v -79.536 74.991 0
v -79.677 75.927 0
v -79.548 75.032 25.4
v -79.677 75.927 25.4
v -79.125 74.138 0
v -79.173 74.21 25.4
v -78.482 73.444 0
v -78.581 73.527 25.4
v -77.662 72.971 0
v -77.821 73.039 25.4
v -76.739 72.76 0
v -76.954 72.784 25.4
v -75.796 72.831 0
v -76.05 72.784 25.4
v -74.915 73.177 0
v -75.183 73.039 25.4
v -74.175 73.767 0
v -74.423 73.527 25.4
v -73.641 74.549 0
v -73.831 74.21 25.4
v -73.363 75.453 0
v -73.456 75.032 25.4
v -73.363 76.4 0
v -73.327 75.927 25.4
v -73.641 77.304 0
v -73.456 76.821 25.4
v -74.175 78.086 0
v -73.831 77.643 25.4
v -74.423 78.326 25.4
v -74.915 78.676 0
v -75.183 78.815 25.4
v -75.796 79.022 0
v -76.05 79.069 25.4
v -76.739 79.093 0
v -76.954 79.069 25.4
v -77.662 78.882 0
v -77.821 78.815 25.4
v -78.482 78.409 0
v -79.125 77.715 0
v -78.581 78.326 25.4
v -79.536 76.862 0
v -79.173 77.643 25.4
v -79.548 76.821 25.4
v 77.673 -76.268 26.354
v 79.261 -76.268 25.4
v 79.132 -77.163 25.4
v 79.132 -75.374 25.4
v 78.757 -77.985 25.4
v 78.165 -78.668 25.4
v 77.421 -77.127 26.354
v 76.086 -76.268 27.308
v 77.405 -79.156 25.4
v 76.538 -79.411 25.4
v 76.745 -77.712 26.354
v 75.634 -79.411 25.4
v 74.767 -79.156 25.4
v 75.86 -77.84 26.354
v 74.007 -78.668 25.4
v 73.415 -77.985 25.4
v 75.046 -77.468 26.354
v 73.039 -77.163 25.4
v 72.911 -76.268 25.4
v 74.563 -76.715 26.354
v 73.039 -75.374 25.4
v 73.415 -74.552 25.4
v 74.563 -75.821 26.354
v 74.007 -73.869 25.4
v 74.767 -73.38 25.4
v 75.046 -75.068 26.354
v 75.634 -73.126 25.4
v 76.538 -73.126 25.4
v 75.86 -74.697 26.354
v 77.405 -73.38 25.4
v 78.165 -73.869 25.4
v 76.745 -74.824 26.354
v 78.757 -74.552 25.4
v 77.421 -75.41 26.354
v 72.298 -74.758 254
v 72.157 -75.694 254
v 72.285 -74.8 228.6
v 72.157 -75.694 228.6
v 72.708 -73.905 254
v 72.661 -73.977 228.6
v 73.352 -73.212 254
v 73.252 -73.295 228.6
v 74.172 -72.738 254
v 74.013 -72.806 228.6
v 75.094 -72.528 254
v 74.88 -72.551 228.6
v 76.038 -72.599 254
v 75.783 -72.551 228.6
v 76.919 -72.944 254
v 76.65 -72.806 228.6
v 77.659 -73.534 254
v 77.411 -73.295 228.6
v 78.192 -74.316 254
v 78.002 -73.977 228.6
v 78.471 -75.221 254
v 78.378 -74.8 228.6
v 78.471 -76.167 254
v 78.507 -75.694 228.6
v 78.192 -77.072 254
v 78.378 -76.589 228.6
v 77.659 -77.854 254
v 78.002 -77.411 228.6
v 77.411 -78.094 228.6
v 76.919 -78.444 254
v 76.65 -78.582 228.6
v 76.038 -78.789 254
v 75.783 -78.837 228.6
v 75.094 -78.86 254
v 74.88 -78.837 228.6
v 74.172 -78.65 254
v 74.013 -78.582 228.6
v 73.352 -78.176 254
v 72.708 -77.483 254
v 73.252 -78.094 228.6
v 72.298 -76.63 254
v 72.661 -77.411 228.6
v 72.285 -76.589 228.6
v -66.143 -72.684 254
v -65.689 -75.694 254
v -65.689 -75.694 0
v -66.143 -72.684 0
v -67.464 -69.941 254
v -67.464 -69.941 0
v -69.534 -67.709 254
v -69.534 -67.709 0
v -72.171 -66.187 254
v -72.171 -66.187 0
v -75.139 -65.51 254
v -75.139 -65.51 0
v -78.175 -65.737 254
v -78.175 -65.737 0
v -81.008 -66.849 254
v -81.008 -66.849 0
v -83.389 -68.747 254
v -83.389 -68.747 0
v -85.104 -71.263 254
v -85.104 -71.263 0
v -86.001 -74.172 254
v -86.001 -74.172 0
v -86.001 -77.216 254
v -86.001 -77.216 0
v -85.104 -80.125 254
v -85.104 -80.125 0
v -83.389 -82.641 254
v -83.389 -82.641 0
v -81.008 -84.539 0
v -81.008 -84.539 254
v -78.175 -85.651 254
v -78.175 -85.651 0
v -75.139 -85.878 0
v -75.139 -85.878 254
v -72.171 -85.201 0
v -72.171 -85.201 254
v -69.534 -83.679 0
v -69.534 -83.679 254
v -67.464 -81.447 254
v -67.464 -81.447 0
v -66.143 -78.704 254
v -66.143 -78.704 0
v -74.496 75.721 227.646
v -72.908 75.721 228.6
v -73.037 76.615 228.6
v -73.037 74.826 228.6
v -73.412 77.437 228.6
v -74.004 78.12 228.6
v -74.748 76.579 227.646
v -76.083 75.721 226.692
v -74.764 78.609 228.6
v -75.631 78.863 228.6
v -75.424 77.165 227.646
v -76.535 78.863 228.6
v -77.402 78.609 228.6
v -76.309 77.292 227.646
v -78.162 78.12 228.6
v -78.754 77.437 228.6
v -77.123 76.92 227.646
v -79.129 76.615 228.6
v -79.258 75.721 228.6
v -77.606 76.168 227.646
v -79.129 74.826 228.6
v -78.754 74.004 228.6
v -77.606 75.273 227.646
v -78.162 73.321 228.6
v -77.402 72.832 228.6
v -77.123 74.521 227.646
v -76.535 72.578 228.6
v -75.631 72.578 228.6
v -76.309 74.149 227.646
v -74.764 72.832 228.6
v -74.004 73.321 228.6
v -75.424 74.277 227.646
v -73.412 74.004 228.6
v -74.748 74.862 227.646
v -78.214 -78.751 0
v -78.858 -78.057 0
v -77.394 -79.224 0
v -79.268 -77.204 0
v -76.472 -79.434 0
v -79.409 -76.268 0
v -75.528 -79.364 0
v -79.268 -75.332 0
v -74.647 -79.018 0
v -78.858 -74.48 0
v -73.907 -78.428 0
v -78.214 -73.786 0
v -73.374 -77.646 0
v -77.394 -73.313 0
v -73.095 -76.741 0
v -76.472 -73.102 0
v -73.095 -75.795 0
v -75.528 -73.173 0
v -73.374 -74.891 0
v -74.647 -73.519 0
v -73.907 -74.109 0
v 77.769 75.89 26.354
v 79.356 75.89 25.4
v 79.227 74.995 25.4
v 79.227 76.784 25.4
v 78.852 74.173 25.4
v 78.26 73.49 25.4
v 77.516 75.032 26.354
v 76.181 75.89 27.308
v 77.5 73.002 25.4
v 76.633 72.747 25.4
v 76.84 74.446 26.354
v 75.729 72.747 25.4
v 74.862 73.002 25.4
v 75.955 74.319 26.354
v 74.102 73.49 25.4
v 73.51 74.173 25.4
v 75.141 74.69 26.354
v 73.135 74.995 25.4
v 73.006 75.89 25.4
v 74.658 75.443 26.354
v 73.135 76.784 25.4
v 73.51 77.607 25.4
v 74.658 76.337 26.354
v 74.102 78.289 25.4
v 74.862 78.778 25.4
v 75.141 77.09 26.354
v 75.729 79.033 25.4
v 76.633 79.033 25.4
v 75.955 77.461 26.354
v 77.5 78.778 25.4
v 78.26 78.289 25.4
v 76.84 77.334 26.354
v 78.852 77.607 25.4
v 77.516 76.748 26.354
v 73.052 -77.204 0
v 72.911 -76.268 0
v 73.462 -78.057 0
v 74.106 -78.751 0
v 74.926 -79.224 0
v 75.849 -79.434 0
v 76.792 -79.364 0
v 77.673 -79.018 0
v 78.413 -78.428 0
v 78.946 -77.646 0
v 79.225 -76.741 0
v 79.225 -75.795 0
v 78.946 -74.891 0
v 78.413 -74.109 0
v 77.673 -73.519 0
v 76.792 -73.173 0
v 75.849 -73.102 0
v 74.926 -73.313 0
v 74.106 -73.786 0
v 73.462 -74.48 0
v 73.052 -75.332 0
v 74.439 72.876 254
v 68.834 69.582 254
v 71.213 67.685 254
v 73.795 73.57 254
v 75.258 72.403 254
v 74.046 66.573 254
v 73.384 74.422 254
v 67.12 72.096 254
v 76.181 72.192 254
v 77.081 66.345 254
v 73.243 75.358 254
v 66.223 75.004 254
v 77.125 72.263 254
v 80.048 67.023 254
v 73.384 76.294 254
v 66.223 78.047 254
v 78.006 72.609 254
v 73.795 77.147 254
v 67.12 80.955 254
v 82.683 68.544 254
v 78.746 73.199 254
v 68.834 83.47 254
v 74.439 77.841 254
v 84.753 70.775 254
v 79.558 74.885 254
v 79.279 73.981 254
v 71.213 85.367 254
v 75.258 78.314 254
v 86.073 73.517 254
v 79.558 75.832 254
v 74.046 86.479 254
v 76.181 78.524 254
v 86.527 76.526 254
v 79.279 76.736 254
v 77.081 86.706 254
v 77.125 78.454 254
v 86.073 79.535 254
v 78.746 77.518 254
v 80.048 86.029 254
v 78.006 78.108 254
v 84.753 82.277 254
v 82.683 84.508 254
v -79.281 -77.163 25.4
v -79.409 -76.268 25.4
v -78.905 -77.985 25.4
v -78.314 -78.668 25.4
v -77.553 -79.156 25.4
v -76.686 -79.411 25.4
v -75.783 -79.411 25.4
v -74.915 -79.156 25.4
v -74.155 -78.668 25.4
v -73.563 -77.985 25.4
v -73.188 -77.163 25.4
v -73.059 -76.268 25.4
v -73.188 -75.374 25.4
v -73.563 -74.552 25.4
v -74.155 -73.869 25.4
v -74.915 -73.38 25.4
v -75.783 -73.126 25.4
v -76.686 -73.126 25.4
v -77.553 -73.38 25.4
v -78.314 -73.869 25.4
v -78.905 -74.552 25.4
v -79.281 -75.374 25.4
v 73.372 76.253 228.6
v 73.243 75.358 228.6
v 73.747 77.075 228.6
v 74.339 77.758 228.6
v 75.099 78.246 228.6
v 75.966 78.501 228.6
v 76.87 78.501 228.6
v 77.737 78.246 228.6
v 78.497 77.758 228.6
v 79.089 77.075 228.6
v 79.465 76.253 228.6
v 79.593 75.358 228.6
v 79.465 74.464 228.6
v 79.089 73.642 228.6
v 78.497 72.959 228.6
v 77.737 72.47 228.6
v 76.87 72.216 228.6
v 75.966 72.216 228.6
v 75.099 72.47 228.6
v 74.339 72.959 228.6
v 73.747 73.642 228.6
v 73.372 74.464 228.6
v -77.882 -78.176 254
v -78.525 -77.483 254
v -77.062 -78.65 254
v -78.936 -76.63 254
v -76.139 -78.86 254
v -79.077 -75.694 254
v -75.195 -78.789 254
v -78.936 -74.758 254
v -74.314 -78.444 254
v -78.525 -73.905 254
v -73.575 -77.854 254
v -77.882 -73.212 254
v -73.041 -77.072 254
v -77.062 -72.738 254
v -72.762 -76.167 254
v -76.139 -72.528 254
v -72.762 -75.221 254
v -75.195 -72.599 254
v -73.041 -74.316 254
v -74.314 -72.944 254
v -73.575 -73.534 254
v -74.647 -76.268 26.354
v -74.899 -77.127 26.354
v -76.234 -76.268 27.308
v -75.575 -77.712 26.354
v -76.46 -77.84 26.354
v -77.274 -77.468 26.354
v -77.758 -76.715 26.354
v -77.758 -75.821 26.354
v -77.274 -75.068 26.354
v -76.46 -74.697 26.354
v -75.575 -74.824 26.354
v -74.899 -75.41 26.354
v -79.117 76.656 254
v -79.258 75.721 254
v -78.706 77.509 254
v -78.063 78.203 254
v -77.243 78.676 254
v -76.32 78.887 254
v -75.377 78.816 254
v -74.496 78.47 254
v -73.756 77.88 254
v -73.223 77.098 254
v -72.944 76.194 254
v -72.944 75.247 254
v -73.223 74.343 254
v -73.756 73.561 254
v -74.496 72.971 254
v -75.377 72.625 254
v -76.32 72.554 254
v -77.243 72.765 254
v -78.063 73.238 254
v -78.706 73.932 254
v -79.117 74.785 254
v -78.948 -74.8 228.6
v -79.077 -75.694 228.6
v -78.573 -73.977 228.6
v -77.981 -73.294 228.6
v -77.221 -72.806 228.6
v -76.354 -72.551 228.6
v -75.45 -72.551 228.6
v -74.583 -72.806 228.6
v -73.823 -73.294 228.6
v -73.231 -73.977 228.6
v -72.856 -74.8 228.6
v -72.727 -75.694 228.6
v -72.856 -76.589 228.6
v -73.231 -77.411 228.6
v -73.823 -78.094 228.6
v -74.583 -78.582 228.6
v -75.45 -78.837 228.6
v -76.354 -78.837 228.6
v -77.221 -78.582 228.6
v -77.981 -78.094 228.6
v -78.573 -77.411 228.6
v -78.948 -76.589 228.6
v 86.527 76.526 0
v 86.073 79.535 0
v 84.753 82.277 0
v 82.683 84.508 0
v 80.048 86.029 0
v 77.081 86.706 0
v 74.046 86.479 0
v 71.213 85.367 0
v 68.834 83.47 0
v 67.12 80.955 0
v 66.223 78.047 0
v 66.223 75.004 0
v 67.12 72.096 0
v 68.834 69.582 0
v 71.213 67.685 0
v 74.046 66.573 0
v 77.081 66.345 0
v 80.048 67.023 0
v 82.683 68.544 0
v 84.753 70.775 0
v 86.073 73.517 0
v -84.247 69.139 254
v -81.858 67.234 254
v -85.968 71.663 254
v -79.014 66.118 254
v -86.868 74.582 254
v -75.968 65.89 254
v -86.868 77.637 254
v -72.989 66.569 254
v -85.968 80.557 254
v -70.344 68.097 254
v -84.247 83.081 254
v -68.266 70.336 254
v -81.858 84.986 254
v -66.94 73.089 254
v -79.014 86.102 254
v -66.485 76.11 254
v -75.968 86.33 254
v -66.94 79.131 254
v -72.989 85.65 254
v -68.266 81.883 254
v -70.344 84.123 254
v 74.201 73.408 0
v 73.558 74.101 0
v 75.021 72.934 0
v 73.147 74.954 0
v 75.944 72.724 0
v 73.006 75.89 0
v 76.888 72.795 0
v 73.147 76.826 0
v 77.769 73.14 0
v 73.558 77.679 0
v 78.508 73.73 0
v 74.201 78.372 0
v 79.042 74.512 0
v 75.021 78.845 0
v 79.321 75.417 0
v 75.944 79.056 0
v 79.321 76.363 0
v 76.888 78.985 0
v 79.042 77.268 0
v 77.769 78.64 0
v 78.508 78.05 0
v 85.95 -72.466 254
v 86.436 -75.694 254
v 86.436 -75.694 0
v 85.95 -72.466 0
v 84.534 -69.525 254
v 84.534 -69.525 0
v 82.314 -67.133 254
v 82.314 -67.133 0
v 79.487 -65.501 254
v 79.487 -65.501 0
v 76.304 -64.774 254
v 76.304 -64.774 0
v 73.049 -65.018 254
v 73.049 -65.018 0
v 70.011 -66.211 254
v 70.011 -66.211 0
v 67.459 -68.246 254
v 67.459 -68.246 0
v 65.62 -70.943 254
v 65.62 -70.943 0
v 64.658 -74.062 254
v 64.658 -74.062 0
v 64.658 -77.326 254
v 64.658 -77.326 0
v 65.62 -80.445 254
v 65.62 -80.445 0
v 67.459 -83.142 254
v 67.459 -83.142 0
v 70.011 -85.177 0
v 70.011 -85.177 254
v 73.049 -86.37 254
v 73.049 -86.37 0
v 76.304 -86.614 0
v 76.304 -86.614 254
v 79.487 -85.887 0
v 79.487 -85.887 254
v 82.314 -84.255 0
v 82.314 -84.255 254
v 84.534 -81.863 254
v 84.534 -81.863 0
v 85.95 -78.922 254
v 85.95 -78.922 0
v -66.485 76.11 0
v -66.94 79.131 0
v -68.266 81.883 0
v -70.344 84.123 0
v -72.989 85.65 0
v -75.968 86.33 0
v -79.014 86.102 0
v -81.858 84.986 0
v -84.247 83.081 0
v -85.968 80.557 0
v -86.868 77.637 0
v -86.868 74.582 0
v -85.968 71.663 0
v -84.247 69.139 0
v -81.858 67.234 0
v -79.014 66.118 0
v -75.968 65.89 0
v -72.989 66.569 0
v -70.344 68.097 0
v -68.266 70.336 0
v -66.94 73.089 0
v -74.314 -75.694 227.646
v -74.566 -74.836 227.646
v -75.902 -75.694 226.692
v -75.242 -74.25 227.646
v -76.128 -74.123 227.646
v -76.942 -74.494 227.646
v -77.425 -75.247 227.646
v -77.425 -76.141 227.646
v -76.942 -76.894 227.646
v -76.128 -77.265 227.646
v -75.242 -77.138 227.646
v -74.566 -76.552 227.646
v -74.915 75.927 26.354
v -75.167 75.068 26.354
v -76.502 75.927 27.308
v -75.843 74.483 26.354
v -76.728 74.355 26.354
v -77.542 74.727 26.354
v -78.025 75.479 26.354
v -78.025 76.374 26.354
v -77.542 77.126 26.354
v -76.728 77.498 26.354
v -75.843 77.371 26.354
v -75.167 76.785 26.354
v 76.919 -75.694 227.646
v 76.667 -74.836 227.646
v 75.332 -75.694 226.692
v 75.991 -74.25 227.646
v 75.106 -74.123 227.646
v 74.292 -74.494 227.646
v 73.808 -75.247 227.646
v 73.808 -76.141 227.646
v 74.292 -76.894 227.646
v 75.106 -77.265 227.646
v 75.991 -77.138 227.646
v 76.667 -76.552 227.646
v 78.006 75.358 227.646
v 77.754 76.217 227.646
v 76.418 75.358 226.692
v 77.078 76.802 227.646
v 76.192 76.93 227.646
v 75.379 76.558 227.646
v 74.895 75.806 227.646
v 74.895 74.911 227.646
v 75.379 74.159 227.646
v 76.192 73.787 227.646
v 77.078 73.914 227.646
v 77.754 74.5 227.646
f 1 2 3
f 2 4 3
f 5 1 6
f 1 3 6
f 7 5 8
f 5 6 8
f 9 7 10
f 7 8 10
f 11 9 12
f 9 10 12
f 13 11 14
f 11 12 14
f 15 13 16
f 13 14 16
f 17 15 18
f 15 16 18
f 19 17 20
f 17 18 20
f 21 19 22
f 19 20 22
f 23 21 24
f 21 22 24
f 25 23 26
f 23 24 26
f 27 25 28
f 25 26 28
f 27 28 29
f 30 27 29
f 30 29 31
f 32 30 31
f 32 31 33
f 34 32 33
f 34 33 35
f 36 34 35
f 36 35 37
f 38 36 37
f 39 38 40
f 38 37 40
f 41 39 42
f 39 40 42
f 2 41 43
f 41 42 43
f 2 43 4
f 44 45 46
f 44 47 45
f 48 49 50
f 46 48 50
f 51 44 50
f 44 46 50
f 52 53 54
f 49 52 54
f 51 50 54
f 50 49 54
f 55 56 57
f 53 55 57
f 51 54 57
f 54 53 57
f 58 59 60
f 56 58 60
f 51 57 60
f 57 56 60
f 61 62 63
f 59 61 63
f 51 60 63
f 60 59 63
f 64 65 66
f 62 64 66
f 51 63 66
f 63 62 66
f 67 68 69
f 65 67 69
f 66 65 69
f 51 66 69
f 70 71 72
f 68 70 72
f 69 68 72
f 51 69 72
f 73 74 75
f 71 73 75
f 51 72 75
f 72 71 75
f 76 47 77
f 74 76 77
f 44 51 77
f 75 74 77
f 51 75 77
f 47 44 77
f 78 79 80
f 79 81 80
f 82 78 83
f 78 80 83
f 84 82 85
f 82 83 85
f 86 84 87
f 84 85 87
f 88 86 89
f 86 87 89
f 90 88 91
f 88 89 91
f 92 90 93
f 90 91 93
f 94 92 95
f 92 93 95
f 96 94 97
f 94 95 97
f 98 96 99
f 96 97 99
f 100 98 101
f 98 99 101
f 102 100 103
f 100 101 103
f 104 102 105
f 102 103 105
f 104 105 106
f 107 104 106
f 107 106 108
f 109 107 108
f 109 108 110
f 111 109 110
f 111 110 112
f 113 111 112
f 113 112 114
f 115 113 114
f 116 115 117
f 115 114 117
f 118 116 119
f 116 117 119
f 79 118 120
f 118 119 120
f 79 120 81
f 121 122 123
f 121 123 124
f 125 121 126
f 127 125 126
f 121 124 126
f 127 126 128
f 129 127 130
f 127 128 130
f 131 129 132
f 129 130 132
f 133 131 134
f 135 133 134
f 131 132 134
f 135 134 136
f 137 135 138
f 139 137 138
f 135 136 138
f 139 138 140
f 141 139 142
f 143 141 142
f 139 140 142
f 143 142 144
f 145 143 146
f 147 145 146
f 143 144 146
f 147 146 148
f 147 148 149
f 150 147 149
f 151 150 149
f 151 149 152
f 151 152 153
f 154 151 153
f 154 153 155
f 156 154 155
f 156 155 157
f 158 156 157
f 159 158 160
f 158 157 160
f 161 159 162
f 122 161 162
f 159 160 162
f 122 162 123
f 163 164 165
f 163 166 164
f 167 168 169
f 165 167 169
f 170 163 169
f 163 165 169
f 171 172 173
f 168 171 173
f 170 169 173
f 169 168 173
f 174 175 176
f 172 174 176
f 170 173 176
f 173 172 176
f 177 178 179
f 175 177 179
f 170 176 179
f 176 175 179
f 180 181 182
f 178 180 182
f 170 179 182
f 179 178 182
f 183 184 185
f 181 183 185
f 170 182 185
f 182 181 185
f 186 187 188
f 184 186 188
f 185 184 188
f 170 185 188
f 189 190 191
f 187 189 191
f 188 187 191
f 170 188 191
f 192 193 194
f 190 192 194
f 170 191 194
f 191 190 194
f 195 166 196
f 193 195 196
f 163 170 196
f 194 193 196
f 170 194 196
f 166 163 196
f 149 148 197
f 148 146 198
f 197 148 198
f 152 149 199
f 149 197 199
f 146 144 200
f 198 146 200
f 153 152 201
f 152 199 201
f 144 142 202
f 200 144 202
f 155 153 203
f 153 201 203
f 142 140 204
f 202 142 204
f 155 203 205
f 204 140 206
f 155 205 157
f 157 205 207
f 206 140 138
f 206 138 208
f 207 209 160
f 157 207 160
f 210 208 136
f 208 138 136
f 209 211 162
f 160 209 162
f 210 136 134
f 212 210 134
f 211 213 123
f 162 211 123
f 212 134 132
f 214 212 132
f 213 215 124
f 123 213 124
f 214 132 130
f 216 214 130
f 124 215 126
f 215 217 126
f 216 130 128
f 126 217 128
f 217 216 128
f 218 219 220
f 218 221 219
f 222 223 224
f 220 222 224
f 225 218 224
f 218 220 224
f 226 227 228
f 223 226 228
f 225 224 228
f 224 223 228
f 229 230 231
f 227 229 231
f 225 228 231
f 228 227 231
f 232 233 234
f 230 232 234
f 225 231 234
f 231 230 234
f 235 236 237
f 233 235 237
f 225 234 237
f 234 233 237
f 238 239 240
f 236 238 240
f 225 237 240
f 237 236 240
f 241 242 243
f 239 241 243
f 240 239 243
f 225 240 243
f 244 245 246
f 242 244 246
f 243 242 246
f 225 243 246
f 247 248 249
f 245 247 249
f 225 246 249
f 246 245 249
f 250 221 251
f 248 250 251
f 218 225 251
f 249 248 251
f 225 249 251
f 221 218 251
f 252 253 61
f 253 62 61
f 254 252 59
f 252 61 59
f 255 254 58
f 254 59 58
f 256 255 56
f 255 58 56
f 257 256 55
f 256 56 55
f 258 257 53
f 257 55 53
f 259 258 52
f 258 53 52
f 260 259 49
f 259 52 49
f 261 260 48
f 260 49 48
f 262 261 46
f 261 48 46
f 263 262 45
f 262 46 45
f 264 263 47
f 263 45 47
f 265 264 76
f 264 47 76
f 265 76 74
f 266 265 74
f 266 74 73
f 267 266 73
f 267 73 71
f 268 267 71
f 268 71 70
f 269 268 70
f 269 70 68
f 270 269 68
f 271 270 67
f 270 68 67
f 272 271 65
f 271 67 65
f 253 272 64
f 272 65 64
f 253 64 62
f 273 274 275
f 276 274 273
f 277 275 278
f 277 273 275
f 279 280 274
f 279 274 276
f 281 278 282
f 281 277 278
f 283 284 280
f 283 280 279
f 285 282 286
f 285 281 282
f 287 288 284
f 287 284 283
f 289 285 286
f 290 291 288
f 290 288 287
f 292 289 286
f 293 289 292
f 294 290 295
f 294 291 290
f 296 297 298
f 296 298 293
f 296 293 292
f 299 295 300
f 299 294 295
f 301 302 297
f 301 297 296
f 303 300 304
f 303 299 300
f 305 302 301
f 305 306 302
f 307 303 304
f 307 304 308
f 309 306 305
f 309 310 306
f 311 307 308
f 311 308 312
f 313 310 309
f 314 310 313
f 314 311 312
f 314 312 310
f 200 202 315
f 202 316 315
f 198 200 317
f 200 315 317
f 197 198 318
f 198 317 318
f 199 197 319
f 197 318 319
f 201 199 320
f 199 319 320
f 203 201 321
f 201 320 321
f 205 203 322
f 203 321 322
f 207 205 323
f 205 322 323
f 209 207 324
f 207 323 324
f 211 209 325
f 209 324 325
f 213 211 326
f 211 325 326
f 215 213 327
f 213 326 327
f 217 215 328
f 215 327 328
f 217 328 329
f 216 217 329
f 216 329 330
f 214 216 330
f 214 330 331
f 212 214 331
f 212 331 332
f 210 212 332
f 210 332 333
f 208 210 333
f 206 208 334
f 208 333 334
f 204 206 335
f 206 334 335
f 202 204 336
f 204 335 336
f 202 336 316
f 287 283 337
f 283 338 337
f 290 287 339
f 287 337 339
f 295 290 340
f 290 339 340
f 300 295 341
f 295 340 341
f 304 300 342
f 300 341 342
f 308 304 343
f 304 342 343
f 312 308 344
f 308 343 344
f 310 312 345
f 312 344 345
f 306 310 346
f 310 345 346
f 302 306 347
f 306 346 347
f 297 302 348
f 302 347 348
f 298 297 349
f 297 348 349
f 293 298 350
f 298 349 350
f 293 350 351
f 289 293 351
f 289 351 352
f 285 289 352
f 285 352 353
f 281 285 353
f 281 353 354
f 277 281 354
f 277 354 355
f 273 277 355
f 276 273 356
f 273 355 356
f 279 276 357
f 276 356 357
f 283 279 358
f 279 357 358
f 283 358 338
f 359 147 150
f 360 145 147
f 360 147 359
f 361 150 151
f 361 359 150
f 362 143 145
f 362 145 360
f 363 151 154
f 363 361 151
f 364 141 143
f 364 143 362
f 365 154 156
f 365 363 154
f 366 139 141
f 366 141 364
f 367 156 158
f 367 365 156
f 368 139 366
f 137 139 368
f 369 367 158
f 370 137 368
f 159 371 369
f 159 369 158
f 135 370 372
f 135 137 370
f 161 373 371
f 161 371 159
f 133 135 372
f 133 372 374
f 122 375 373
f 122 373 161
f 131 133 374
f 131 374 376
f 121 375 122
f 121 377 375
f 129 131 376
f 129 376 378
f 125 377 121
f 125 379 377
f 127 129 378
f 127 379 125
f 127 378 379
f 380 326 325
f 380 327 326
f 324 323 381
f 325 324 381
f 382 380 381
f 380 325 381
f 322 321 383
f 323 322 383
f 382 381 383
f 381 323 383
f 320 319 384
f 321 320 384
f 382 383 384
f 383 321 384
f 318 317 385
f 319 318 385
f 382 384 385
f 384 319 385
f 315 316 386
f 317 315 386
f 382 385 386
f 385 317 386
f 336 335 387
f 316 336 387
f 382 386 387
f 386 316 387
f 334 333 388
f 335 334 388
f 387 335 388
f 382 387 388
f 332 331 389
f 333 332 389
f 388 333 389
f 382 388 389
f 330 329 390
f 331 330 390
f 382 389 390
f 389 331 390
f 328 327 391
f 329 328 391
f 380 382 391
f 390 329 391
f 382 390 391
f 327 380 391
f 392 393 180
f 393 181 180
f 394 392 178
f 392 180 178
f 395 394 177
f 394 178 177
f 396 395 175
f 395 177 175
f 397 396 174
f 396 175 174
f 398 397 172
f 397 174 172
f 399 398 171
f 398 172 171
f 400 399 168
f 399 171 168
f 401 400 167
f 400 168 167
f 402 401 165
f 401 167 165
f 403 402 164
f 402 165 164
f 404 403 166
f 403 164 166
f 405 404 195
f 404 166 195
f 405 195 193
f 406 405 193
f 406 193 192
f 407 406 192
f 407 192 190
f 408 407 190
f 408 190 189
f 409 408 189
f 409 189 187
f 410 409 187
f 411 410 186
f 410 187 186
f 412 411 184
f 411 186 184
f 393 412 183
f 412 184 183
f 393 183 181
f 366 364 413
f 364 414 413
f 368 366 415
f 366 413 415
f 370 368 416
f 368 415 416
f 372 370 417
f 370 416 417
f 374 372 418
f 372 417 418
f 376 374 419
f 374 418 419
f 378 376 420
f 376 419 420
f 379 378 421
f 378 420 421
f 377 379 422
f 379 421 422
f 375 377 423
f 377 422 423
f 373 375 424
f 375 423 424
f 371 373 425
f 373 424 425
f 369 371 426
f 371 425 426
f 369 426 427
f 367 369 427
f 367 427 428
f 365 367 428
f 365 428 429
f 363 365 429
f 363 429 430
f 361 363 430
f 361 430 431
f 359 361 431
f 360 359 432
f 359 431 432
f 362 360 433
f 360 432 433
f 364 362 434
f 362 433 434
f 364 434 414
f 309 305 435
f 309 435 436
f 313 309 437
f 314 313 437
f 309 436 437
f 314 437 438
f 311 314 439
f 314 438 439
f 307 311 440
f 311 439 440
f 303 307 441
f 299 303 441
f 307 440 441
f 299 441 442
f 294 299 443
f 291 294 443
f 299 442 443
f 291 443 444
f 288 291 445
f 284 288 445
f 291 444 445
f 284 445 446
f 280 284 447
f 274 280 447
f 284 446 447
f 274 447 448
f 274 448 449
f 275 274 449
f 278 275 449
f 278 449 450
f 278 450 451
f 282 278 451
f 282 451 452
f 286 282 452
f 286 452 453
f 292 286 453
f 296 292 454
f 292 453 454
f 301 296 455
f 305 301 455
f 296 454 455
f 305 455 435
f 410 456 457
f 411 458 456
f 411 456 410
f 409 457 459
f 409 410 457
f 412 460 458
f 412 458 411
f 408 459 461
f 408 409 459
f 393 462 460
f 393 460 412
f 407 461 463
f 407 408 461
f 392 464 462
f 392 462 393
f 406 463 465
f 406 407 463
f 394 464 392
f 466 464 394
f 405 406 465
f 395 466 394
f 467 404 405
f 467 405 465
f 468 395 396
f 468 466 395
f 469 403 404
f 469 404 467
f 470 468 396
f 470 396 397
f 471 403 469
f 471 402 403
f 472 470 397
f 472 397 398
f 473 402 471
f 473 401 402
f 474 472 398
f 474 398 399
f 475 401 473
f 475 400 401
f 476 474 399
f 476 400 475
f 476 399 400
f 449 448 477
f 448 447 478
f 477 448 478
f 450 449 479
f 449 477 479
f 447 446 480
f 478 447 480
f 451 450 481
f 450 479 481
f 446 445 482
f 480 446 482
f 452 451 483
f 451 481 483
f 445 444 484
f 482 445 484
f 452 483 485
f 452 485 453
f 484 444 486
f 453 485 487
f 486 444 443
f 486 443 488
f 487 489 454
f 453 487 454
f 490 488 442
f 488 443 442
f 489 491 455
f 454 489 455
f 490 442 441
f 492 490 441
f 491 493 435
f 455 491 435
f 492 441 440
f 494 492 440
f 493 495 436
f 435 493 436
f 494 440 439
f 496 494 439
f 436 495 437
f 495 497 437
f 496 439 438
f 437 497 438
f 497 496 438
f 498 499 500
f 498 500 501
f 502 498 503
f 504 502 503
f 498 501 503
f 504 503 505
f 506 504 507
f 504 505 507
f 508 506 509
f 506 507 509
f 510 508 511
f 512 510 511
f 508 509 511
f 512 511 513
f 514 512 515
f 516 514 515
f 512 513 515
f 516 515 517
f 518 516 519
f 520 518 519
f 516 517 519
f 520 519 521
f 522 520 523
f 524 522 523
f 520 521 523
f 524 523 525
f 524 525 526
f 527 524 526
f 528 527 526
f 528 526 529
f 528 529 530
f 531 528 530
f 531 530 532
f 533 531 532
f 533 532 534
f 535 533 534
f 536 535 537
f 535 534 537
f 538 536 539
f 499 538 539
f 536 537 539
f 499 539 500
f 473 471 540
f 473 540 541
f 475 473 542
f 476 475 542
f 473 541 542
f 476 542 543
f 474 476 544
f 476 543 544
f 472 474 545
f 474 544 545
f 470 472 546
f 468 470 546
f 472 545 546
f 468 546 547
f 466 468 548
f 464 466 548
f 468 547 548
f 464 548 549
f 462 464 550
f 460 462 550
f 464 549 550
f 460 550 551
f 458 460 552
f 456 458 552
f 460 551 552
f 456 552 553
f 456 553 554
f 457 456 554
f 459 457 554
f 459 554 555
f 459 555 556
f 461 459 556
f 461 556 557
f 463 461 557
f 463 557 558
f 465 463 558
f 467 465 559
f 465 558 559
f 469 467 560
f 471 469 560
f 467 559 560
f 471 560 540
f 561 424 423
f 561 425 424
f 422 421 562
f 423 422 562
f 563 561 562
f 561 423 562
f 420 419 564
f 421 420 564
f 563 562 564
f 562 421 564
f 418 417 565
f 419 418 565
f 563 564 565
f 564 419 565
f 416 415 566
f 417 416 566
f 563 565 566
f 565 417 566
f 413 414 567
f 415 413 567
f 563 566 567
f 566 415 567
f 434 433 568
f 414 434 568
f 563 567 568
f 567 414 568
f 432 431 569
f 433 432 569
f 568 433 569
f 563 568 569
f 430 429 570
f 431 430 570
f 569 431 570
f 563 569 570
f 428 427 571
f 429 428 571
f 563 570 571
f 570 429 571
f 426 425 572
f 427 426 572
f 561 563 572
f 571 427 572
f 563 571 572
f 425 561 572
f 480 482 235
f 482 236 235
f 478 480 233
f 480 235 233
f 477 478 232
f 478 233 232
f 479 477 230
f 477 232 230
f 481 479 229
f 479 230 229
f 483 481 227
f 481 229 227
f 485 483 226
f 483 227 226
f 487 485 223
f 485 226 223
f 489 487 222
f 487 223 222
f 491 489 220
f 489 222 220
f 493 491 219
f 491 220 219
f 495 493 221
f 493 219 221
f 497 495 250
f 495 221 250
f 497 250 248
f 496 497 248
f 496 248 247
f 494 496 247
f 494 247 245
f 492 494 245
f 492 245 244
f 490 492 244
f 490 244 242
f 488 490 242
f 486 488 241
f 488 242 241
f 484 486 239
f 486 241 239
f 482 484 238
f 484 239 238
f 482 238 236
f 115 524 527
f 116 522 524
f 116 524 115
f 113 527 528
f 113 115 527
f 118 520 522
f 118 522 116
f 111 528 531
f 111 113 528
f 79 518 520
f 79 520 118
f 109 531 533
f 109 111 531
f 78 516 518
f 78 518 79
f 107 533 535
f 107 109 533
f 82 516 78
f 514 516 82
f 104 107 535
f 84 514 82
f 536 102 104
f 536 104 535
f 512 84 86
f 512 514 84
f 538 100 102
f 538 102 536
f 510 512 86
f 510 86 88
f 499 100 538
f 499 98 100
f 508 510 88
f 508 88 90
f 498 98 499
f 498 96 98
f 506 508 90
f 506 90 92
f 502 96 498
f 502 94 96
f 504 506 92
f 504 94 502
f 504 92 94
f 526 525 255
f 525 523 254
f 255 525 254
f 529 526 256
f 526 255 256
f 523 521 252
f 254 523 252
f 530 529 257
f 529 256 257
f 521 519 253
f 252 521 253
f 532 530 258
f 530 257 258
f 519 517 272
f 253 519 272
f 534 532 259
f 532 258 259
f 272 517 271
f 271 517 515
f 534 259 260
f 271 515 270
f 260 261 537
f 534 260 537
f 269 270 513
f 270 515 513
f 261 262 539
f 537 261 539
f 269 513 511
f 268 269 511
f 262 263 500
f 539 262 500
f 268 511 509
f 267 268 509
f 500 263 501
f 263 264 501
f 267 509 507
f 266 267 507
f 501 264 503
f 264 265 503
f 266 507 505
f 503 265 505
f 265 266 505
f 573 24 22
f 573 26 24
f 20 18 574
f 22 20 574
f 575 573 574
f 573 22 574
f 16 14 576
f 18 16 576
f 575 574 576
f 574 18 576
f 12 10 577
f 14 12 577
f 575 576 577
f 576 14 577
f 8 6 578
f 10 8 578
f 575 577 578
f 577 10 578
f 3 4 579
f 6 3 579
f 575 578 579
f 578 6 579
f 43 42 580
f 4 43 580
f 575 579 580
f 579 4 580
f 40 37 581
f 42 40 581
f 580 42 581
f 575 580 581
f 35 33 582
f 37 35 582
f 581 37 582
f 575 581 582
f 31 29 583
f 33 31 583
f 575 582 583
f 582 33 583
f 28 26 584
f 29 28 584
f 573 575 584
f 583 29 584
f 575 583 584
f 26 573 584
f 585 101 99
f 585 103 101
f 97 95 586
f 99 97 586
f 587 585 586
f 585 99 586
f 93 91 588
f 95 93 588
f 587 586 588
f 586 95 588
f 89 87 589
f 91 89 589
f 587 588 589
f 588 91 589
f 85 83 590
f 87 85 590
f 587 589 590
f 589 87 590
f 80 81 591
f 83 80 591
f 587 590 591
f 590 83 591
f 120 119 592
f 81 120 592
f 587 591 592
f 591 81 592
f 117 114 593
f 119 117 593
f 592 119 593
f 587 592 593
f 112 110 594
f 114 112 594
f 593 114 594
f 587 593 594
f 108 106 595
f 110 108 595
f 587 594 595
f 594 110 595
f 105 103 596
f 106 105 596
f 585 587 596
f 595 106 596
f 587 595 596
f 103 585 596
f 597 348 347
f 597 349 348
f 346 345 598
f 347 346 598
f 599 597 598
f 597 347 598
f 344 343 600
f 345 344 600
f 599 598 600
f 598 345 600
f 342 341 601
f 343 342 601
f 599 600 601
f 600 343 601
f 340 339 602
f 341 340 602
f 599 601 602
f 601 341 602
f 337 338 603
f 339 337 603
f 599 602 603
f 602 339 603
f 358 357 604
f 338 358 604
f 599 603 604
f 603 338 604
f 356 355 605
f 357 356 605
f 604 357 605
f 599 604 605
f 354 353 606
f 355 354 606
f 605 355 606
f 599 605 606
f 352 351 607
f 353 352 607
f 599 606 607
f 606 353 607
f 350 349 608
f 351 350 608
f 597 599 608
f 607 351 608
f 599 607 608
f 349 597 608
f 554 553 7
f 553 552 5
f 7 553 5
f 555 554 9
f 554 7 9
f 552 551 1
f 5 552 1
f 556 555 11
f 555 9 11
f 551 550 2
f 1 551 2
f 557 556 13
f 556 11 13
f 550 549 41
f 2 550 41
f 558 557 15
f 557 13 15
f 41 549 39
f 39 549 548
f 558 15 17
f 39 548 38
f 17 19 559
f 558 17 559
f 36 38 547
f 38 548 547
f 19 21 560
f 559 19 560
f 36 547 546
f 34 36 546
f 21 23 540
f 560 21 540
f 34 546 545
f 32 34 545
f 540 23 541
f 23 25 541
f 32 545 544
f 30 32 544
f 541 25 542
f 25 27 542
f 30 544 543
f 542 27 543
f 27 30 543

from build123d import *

# Parameters (mm, degrees)
F0_R       = 10.2489411148
F1_DEPTH   = 254
F0_R_2     = 10.2089969217
F0_R_3     = 10.9504197112
F0_R_4     = 10.2130357503
F3_D       = 6.35
F3_DEPTH   = 25.4
F3_TIP     = 1.9077324654
F3_2_D     = 6.35
F3_2_DEPTH = 25.4
F3_2_TIP   = 1.9077324654
F3_3_D     = 6.35
F3_3_DEPTH = 25.4
F3_3_TIP   = 1.9077324654
F3_4_D     = 6.35
F3_4_DEPTH = 25.4
F3_4_TIP   = 1.9077324654
F5_D       = 6.35
F5_DEPTH   = 25.4
F5_TIP     = 1.9077324654
F5_2_D     = 6.35
F5_2_DEPTH = 25.4
F5_2_TIP   = 1.9077324654
F5_3_D     = 6.35
F5_3_DEPTH = 25.4
F5_3_TIP   = 1.9077324654
F5_4_D     = 6.35
F5_4_DEPTH = 25.4
F5_4_TIP   = 1.9077324654


with BuildPart() as f1:
    # F0 (on Top) → F1 (new body)
    with BuildSketch(Plane.XY):
        with Locations((-76.7337605357, 76.1099159718)):
            Circle(F0_R)
    extrude(amount=F1_DEPTH)

    # F3
    with Locations(Plane.XY.offset(254)):
        with Locations((-76.0830789804, 75.7205635309), (76.4182135463, 75.3583312035), (75.3315091133, -75.6940171123), (-75.9019628167, -75.6940022111)):
            Hole(F3_D / 2, depth=F3_DEPTH)
            with Locations((0, 0, -(F3_DEPTH + F3_TIP / 2))):  # 118° drill point
                Cone(0, F3_D / 2, F3_TIP, mode=Mode.SUBTRACT)

    # F5
    with Locations(Plane(origin=(0, 0, 0), x_dir=(1, 0, 0), z_dir=(0, 0, -1))):
        with Locations((-76.2344002724, 76.2682408094), (76.08576864, 76.2682408094), (76.1810094118, -75.8899748325), (-76.5020474792, -75.9265944362)):
            Hole(F5_D / 2, depth=F5_DEPTH)
            with Locations((0, 0, -(F5_DEPTH + F5_TIP / 2))):  # 118° drill point
                Cone(0, F5_D / 2, F5_TIP, mode=Mode.SUBTRACT)


with BuildPart() as f1b:
    # F0 (on Top) → F1, piece 2 (new body)
    with BuildSketch(Plane.XY):
        with Locations((76.3178616762, 76.5258148313)):
            Circle(F0_R_2)
    extrude(amount=F1_DEPTH)

    # F3#2
    with Locations(Plane.XY.offset(254)):
        with Locations((-76.0830789804, 75.7205635309), (76.4182135463, 75.3583312035), (75.3315091133, -75.6940171123), (-75.9019628167, -75.6940022111)):
            Hole(F3_2_D / 2, depth=F3_2_DEPTH)
            with Locations((0, 0, -(F3_2_DEPTH + F3_2_TIP / 2))):  # 118° drill point
                Cone(0, F3_2_D / 2, F3_2_TIP, mode=Mode.SUBTRACT)

    # F5#2
    with Locations(Plane(origin=(0, 0, 0), x_dir=(1, 0, 0), z_dir=(0, 0, -1))):
        with Locations((-76.2344002724, 76.2682408094), (76.08576864, 76.2682408094), (76.1810094118, -75.8899748325), (-76.5020474792, -75.9265944362)):
            Hole(F5_2_D / 2, depth=F5_2_DEPTH)
            with Locations((0, 0, -(F5_2_DEPTH + F5_2_TIP / 2))):  # 118° drill point
                Cone(0, F5_2_D / 2, F5_2_TIP, mode=Mode.SUBTRACT)


with BuildPart() as f1c:
    # F0 (on Top) → F1, piece 3 (new body)
    with BuildSketch(Plane.XY):
        with Locations((75.4860490561, -75.6940022111)):
            Circle(F0_R_3)
    extrude(amount=F1_DEPTH)

    # F3#3
    with Locations(Plane.XY.offset(254)):
        with Locations((-76.0830789804, 75.7205635309), (76.4182135463, 75.3583312035), (75.3315091133, -75.6940171123), (-75.9019628167, -75.6940022111)):
            Hole(F3_3_D / 2, depth=F3_3_DEPTH)
            with Locations((0, 0, -(F3_3_DEPTH + F3_3_TIP / 2))):  # 118° drill point
                Cone(0, F3_3_D / 2, F3_3_TIP, mode=Mode.SUBTRACT)

    # F5#3
    with Locations(Plane(origin=(0, 0, 0), x_dir=(1, 0, 0), z_dir=(0, 0, -1))):
        with Locations((-76.2344002724, 76.2682408094), (76.08576864, 76.2682408094), (76.1810094118, -75.8899748325), (-76.5020474792, -75.9265944362)):
            Hole(F5_3_D / 2, depth=F5_3_DEPTH)
            with Locations((0, 0, -(F5_3_DEPTH + F5_3_TIP / 2))):  # 118° drill point
                Cone(0, F5_3_D / 2, F5_3_TIP, mode=Mode.SUBTRACT)


with BuildPart() as f1d:
    # F0 (on Top) → F1, piece 4 (new body)
    with BuildSketch(Plane.XY):
        with Locations((-75.9019628167, -75.6940022111)):
            Circle(F0_R_4)
    extrude(amount=F1_DEPTH)

    # F3#4
    with Locations(Plane.XY.offset(254)):
        with Locations((-76.0830789804, 75.7205635309), (76.4182135463, 75.3583312035), (75.3315091133, -75.6940171123), (-75.9019628167, -75.6940022111)):
            Hole(F3_4_D / 2, depth=F3_4_DEPTH)
            with Locations((0, 0, -(F3_4_DEPTH + F3_4_TIP / 2))):  # 118° drill point
                Cone(0, F3_4_D / 2, F3_4_TIP, mode=Mode.SUBTRACT)

    # F5#4
    with Locations(Plane(origin=(0, 0, 0), x_dir=(1, 0, 0), z_dir=(0, 0, -1))):
        with Locations((-76.2344002724, 76.2682408094), (76.08576864, 76.2682408094), (76.1810094118, -75.8899748325), (-76.5020474792, -75.9265944362)):
            Hole(F5_4_D / 2, depth=F5_4_DEPTH)
            with Locations((0, 0, -(F5_4_DEPTH + F5_4_TIP / 2))):  # 118° drill point
                Cone(0, F5_4_D / 2, F5_4_TIP, mode=Mode.SUBTRACT)


solid = Compound([f1.part, f1b.part, f1c.part, f1d.part])
